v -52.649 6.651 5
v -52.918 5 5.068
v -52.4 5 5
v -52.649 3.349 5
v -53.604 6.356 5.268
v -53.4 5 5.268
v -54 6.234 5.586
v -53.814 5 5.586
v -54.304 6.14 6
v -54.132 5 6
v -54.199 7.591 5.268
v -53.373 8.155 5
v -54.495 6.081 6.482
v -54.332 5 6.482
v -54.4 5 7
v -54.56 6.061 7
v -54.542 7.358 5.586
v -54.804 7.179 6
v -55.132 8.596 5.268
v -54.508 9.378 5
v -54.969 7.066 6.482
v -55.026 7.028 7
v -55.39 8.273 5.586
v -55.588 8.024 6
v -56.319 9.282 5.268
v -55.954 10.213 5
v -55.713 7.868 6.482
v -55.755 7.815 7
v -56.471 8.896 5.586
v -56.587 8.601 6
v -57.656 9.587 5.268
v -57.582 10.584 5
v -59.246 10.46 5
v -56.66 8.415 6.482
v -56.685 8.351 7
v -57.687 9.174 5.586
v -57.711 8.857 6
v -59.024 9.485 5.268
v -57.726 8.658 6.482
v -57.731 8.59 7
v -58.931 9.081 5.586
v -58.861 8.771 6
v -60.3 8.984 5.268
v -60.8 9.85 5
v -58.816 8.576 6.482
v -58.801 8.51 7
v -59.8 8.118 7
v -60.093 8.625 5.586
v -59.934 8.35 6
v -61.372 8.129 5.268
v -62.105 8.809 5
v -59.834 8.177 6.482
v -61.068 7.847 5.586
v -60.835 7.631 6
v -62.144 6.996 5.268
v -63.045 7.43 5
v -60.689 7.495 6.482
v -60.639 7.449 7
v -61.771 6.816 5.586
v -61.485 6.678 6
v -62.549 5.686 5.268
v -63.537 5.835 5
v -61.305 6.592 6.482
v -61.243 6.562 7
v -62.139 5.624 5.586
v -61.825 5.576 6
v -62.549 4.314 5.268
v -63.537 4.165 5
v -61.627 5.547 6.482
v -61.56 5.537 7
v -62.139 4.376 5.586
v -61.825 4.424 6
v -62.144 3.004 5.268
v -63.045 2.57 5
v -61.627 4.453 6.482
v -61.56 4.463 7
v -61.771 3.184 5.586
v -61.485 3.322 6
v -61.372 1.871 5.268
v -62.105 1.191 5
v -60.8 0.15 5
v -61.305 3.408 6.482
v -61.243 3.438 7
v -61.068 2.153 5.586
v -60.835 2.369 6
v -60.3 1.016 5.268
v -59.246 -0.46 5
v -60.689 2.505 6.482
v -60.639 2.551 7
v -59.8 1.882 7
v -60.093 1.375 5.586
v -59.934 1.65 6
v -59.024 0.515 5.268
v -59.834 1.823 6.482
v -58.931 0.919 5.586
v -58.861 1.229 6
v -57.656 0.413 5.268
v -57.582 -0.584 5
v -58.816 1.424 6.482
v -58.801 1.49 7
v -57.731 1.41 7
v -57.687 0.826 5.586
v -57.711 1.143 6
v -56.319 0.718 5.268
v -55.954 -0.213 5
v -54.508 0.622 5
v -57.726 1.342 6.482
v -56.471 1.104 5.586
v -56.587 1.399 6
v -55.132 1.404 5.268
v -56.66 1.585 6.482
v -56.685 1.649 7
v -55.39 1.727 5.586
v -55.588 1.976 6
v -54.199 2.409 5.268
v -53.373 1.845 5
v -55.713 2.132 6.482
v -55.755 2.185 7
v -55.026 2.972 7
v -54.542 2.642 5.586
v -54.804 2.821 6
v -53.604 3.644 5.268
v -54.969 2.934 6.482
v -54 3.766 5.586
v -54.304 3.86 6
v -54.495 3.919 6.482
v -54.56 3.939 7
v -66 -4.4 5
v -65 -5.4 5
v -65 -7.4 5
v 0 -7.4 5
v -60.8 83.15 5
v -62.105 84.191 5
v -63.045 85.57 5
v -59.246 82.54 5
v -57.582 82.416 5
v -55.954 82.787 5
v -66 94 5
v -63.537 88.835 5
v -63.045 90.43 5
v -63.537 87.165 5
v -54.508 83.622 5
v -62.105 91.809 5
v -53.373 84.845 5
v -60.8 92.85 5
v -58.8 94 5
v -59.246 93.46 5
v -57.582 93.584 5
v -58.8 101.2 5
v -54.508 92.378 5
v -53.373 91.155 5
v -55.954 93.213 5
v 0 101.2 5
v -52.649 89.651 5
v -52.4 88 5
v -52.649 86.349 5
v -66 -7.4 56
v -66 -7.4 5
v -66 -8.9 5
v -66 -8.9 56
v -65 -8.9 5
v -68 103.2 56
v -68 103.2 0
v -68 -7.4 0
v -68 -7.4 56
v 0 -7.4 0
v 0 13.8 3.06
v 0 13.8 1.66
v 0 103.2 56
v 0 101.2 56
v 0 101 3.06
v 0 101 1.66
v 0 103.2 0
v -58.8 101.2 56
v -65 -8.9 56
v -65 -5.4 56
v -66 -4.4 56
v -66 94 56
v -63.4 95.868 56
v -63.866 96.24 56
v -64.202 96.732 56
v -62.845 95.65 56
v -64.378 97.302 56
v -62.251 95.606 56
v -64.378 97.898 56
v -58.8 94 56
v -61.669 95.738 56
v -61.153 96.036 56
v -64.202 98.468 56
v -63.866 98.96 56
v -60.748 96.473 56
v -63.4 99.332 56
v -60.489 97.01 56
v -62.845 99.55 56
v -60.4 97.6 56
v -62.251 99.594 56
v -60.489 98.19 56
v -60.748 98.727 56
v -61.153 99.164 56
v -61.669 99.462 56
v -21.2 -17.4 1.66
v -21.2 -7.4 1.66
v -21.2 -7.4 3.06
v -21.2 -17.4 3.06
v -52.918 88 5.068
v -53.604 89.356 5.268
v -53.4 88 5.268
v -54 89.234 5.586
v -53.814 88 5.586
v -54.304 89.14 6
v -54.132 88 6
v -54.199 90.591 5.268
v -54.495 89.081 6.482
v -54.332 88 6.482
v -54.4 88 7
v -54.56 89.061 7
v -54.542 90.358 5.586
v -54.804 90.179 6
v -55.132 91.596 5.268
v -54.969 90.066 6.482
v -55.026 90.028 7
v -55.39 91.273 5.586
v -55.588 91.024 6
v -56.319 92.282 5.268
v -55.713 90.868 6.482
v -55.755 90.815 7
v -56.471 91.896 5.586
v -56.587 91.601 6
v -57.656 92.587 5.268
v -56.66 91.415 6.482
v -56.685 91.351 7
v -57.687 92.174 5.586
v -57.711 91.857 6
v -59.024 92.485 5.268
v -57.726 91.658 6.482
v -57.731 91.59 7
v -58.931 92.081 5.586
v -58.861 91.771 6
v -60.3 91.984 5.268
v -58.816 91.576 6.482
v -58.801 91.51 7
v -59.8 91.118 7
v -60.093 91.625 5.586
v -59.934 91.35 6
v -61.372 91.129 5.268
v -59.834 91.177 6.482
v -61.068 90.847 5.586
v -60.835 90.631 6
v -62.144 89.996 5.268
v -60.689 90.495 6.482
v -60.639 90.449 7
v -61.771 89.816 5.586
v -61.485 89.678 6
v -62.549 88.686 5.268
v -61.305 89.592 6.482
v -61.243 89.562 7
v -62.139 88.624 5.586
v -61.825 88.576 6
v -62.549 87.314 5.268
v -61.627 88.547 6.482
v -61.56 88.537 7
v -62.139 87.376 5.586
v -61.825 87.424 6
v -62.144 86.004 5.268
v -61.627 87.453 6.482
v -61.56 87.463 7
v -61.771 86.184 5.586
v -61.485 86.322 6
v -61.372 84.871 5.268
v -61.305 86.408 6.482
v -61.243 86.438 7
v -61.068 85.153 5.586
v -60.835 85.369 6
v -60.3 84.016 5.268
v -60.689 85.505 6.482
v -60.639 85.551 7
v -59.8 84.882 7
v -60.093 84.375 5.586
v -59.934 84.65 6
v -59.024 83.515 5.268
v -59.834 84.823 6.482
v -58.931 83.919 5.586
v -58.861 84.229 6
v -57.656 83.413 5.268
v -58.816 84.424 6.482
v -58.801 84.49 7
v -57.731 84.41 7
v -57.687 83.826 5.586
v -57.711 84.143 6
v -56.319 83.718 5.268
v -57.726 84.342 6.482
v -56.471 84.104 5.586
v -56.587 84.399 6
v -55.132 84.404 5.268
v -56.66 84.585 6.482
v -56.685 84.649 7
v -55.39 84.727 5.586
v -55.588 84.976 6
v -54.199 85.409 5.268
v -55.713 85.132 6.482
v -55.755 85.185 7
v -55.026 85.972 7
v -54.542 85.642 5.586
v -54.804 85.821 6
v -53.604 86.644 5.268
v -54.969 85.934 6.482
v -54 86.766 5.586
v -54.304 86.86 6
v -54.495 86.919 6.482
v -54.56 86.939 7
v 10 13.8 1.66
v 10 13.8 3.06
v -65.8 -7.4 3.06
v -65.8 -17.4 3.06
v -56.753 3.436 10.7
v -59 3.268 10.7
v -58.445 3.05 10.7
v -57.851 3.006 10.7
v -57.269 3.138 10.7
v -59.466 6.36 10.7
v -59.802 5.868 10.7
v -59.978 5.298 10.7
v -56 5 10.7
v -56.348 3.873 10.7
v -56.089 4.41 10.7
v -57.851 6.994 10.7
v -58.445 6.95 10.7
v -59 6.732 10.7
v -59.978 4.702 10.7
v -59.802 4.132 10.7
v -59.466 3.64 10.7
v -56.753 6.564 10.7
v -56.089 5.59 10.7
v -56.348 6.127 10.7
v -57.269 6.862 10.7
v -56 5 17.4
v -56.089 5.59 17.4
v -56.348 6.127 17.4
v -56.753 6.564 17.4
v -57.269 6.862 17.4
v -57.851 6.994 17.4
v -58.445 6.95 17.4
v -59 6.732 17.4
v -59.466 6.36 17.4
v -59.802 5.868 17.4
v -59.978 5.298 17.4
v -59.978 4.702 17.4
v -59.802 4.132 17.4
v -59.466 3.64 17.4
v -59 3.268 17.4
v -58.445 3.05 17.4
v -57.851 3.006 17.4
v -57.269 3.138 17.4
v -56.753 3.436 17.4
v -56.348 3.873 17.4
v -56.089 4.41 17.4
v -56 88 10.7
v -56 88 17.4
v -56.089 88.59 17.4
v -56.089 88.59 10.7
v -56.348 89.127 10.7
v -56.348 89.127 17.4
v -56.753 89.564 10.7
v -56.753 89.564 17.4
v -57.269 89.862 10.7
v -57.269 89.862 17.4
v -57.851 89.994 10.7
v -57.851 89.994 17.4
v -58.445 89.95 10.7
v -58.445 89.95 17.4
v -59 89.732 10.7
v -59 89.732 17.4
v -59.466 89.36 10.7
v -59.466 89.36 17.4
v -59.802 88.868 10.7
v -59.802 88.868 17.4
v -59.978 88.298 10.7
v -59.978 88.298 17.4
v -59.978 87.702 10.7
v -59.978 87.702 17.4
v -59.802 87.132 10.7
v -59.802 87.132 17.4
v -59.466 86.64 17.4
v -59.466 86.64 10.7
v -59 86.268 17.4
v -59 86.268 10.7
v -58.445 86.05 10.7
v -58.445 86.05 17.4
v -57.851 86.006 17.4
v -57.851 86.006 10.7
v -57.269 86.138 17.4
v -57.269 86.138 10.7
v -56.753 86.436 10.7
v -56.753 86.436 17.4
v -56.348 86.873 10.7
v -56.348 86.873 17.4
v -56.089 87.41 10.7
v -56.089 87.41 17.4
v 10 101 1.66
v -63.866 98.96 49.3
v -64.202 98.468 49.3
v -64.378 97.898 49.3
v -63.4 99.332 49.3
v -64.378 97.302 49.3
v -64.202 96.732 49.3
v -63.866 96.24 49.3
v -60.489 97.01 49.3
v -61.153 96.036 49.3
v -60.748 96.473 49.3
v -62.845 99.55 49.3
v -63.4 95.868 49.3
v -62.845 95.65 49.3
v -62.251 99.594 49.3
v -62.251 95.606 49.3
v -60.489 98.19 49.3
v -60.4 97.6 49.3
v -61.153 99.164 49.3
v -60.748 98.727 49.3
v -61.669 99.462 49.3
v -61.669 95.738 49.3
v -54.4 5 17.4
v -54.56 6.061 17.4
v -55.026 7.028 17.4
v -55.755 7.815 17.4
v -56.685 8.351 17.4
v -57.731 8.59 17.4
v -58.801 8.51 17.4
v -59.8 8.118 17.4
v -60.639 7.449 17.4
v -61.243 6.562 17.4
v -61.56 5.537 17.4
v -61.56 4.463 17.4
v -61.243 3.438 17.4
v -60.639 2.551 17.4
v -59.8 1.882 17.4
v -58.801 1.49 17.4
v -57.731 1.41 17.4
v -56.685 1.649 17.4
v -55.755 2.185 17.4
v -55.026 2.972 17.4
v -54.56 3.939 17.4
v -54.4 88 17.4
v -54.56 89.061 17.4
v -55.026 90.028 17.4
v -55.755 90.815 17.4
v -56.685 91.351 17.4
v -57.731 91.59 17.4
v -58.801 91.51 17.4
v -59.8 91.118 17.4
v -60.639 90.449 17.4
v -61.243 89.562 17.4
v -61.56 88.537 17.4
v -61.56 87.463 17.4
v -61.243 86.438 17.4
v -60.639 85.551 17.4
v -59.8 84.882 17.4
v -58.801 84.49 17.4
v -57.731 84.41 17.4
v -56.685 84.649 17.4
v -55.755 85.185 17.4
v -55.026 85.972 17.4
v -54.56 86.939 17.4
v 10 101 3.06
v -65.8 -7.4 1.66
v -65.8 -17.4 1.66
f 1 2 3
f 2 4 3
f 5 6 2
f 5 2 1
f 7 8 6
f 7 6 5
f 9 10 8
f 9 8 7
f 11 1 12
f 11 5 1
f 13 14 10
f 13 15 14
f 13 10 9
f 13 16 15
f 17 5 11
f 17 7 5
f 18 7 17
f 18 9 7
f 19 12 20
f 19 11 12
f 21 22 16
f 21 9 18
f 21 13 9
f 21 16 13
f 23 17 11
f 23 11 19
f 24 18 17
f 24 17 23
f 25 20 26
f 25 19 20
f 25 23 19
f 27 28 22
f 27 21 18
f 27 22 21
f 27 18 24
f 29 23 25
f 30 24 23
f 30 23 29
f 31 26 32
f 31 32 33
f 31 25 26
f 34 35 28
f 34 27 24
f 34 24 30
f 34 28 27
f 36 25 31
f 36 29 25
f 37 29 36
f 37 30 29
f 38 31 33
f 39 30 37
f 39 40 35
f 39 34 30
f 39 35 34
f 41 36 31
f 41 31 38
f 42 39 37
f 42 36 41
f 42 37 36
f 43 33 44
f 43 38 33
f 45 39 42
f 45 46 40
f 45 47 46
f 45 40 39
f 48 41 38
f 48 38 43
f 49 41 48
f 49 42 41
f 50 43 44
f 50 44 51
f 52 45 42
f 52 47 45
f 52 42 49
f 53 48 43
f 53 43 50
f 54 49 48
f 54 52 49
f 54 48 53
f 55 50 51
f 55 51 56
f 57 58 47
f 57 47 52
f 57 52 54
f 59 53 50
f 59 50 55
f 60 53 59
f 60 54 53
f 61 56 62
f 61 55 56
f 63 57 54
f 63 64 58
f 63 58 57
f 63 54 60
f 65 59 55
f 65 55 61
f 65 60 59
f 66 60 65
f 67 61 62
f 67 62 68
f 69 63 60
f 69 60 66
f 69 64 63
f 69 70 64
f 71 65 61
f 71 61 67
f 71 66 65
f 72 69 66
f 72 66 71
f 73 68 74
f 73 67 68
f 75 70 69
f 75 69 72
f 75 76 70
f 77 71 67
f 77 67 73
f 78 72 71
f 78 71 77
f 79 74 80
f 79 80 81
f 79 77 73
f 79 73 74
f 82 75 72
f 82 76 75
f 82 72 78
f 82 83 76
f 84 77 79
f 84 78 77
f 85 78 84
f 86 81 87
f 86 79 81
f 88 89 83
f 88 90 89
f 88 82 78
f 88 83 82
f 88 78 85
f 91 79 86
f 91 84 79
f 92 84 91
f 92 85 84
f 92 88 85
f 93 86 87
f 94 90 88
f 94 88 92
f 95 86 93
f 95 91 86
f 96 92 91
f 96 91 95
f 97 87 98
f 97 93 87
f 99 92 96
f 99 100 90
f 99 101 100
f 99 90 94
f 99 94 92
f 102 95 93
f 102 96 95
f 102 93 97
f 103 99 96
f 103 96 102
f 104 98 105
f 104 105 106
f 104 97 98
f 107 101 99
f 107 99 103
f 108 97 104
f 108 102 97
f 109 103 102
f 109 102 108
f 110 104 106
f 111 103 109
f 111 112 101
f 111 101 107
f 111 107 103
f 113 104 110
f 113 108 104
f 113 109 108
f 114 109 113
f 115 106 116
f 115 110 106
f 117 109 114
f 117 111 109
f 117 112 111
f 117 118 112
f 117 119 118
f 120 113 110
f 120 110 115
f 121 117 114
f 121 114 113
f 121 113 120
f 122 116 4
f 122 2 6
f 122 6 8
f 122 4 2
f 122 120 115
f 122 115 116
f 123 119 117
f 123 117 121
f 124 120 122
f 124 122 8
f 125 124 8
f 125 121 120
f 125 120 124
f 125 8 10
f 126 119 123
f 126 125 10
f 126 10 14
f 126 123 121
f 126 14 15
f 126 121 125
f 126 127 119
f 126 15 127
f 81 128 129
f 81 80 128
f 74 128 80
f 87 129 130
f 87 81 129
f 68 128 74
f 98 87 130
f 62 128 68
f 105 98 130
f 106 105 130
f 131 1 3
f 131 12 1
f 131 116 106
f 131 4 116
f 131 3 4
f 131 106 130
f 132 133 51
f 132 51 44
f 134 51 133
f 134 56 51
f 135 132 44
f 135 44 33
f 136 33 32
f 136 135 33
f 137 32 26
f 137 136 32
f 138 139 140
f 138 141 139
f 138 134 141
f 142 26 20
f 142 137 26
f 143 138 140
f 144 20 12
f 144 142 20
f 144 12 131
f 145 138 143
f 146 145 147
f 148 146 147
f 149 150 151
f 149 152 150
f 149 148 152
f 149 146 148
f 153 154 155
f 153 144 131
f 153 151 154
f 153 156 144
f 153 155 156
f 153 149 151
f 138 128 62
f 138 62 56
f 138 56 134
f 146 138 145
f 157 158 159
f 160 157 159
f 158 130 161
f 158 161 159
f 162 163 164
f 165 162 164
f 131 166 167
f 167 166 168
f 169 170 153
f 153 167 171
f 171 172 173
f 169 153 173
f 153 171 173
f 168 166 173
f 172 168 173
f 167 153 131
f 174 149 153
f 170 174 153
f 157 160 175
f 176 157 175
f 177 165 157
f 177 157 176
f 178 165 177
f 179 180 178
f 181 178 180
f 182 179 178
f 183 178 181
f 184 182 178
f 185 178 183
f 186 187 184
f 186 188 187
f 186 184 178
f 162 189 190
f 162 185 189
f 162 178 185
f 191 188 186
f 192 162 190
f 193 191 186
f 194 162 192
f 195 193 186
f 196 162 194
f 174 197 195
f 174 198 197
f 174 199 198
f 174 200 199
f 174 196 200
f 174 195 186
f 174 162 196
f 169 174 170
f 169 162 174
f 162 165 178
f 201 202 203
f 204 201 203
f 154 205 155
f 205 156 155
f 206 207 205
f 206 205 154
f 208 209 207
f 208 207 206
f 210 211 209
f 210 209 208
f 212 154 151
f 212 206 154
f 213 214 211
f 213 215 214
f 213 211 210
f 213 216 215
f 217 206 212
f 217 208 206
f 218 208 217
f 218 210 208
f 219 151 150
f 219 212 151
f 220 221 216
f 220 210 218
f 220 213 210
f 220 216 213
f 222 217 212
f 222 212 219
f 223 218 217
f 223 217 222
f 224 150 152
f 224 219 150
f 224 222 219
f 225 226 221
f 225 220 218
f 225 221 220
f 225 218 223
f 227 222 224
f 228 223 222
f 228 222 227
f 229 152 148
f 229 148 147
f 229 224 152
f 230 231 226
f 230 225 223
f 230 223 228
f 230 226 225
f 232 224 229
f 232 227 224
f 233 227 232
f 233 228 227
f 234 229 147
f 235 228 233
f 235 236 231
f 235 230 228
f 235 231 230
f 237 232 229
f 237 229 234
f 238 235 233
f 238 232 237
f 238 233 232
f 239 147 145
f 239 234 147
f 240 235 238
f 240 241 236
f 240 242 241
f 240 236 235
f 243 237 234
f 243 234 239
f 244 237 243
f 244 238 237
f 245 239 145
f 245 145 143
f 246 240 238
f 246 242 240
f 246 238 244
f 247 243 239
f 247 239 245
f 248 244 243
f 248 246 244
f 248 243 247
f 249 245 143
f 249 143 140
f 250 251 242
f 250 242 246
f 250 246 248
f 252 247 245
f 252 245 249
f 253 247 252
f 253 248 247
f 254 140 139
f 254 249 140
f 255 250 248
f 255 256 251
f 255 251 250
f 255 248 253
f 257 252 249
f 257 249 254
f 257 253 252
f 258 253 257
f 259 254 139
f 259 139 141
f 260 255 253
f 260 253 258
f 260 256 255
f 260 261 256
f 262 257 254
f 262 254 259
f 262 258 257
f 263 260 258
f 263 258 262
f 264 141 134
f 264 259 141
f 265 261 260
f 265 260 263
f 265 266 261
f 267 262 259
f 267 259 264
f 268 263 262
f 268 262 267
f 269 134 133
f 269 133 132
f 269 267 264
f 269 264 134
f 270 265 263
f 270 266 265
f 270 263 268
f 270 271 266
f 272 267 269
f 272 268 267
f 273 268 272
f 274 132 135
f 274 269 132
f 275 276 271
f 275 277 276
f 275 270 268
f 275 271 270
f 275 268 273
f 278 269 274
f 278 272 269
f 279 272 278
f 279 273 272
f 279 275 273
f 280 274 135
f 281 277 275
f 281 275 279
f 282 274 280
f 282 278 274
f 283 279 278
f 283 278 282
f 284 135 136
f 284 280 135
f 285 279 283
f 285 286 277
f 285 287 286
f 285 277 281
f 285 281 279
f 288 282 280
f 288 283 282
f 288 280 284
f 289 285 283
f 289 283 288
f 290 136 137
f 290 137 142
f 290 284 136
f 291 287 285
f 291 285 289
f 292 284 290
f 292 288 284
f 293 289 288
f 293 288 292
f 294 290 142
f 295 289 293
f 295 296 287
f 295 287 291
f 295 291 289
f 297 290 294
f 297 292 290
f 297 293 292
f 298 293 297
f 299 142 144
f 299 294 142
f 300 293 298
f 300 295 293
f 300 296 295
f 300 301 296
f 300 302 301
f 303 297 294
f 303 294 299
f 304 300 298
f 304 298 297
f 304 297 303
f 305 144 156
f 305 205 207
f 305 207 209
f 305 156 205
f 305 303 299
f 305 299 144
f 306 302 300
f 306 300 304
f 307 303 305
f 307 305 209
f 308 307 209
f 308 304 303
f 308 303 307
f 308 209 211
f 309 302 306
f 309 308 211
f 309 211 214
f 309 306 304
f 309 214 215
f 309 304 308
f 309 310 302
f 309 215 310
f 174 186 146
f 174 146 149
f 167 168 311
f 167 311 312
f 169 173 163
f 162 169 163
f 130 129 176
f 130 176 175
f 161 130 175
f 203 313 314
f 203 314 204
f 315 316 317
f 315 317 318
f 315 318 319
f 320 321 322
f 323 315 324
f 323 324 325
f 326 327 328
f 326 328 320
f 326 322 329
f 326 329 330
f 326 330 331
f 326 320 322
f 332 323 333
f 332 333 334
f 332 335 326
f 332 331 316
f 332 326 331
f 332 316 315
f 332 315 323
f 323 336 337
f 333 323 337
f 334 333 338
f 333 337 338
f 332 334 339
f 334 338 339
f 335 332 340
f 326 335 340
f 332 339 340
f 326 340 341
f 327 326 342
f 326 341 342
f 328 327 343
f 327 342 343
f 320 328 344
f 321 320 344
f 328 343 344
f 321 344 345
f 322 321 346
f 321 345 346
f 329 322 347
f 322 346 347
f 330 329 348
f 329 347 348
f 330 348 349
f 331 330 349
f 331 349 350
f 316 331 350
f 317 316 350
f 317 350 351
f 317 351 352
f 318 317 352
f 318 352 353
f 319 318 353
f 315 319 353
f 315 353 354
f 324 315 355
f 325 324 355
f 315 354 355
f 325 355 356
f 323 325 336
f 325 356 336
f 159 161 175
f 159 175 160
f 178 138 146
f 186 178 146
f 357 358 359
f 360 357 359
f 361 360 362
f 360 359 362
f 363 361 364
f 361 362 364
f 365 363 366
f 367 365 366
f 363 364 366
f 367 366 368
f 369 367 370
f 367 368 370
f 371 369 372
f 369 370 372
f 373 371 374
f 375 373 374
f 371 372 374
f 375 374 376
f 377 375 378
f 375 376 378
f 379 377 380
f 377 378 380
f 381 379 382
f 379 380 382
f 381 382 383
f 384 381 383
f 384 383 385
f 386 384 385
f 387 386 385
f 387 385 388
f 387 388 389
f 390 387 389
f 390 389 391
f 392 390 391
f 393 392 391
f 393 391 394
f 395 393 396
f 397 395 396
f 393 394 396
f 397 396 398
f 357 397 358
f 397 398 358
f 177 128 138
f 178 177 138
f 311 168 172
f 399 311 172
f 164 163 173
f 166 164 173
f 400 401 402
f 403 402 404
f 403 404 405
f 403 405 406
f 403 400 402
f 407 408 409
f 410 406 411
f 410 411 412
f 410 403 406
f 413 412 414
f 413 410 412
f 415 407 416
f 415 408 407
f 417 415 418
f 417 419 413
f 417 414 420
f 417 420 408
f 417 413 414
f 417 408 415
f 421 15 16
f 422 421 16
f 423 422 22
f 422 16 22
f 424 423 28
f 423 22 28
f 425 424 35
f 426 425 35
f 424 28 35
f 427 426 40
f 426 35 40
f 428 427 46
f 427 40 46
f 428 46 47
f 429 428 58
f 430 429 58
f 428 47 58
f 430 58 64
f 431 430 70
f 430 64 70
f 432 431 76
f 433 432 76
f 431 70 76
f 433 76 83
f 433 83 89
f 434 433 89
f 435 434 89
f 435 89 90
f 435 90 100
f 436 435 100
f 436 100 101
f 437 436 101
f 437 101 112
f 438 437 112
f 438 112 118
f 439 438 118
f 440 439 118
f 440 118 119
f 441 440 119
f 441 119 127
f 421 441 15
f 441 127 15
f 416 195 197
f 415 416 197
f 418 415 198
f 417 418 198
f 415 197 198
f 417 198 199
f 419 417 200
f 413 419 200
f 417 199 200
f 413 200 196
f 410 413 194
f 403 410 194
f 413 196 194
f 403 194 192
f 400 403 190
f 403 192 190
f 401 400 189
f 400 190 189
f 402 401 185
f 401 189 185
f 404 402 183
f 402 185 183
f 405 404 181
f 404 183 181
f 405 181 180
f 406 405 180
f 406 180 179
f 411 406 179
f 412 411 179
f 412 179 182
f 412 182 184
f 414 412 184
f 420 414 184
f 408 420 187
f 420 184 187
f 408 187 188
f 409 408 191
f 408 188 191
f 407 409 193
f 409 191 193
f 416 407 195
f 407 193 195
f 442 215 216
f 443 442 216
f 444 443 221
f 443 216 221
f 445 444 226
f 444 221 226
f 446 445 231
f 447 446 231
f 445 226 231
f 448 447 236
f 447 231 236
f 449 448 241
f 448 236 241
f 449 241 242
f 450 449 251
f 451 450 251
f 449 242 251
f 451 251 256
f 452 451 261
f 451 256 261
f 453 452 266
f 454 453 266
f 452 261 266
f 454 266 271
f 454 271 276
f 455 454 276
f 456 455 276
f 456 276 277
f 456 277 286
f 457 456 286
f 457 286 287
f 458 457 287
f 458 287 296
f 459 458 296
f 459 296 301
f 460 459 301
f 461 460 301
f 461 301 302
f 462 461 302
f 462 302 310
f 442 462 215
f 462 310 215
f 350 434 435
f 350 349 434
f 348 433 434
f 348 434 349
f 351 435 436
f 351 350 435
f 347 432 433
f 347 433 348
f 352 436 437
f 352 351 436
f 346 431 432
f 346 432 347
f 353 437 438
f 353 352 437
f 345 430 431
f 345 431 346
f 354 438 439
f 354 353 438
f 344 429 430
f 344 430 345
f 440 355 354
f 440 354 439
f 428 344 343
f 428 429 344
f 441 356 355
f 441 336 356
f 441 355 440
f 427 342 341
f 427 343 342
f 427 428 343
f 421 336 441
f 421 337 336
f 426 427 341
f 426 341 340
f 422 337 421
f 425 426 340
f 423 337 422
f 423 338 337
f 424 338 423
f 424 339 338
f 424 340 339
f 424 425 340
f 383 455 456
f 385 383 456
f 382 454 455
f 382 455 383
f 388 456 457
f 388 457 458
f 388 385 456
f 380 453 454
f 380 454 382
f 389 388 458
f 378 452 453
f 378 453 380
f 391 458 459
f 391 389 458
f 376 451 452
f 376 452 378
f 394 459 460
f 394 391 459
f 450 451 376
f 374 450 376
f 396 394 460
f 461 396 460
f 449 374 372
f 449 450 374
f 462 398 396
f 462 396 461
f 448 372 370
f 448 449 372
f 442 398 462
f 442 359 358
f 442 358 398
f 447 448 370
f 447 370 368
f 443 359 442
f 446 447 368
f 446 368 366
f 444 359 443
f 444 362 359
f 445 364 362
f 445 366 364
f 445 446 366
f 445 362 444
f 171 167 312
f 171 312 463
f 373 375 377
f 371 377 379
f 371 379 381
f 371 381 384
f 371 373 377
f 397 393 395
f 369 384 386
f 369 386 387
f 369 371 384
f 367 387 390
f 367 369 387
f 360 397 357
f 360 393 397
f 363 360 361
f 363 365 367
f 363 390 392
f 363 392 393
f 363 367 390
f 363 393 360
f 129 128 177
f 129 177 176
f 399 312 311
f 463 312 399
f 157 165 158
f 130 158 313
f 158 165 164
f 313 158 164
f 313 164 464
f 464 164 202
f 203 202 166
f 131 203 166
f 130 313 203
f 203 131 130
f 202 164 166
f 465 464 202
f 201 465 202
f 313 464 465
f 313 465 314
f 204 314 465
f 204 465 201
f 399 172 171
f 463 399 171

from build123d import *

# Parameters (mm, degrees)
SKETCH_1_W      = 63
SKETCH_1_H      = 93
PAD_DEPTH       = 5
SKETCH_W        = 63
SKETCH_H        = 7.4
PAD001_DEPTH    = 5
PAD002_DEPTH    = 5
PAD003_DEPTH    = 51
SKETCH005_W     = 87.2
SKETCH005_H     = 1.4
PAD005_DEPTH    = 10
SKETCH006_R     = 3.6
PAD006_DEPTH    = 12.4
SKETCH007_R     = 2
POCKET001_DEPTH = 6.7
SKETCH008_W     = 44.6
SKETCH008_H     = 1.4
PAD007_DEPTH    = 10
PAD008_DEPTH    = 51
SKETCH010_W     = 7.2
SKETCH010_H     = 7.2
PAD009_DEPTH    = 51
SKETCH011_R     = 2
POCKET_DEPTH    = 6.7
FILLET_R        = 2


with BuildPart() as part:
    # Sketch_1 → Pad (new body)
    with BuildSketch(Plane.XY):
        with Locations((-31.5, 46.5)):
            Rectangle(SKETCH_1_W, SKETCH_1_H)
    extrude(amount=PAD_DEPTH)

    # Sketch → Pad001 (join)
    with BuildSketch(Plane.XY):
        with Locations((-31.5, -3.7)):
            Rectangle(SKETCH_W, SKETCH_H)
    extrude(amount=PAD001_DEPTH)

    # Sketch001 → Pad002 (join)
    with BuildSketch(Plane.XY):
        Polygon((-68, 103.2), (-68, -7.4), (-63, -7.4), (-63, 93), (0, 93), (0, 103.2), align=None)
    extrude(amount=PAD002_DEPTH)

    # Sketch002 (on Face13 of Pad002) → Pad003 (join)
    with BuildSketch(Plane.XY.offset(5)):
        Polygon((-68, 103.2), (-68, -7.4), (-66, -7.4), (-66, 101.2), (0, 101.2), (0, 103.2), align=None)
    extrude(amount=PAD003_DEPTH)

    # Sketch005 → Pad005 (join)
    with BuildSketch(Plane.YZ):
        with Locations((57.4, 2.36)):
            Rectangle(SKETCH005_W, SKETCH005_H)
    extrude(amount=PAD005_DEPTH)

    # Sketch006 (on Face11 of Pad005) → Pad006 (join)
    with BuildSketch(Plane.XY.offset(5)):
        with Locations((-58, 5)):
            Circle(SKETCH006_R)
        with Locations((-58, 88)):
            Circle(SKETCH006_R)
    extrude(amount=PAD006_DEPTH)

    # Sketch007 (on Face28 of Pad006) → Pocket001 (cut)
    with BuildSketch(Plane.XY.offset(17.4)):
        with Locations((-58, 5)):
            Circle(SKETCH007_R)
        with Locations((-58, 88)):
            Circle(SKETCH007_R)
    extrude(amount=-POCKET001_DEPTH, mode=Mode.SUBTRACT)

    # Sketch008 (on Face5 of Pocket001) → Pad007 (join)
    with BuildSketch(Plane.XZ.offset(7.4)):
        with Locations((-43.5, 2.36)):
            Rectangle(SKETCH008_W, SKETCH008_H)
    extrude(amount=PAD007_DEPTH)

    # Sketch009 (on Face21 of Pad007) → Pad008 (join)
    with BuildSketch(Plane.XY.offset(5)):
        Polygon((-65, -5.4), (-65, -8.9), (-66, -8.9), (-66, -5.4), (-66, -4.4), align=None)
    extrude(amount=PAD008_DEPTH)

    # Sketch010 (on Face22 of Pad008) → Pad009 (join)
    with BuildSketch(Plane.XY.offset(5)):
        with Locations((-62.4, 97.6)):
            Rectangle(SKETCH010_W, SKETCH010_H)
    extrude(amount=PAD009_DEPTH)

    # Sketch011 (on Face43 of Pad009) → Pocket (cut)
    with BuildSketch(Plane.XY.offset(56)):
        with Locations((-62.4, 97.6)):
            Circle(SKETCH011_R)
    extrude(amount=-POCKET_DEPTH, mode=Mode.SUBTRACT)

    # Fillet
    fillet_edges = [part.edges().sort_by_distance(p)[0] for p in [
        (-61.6, 5, 5),
        (-61.6, 88, 5),
    ]]
    fillet(fillet_edges, radius=FILLET_R)


solid = part.part
